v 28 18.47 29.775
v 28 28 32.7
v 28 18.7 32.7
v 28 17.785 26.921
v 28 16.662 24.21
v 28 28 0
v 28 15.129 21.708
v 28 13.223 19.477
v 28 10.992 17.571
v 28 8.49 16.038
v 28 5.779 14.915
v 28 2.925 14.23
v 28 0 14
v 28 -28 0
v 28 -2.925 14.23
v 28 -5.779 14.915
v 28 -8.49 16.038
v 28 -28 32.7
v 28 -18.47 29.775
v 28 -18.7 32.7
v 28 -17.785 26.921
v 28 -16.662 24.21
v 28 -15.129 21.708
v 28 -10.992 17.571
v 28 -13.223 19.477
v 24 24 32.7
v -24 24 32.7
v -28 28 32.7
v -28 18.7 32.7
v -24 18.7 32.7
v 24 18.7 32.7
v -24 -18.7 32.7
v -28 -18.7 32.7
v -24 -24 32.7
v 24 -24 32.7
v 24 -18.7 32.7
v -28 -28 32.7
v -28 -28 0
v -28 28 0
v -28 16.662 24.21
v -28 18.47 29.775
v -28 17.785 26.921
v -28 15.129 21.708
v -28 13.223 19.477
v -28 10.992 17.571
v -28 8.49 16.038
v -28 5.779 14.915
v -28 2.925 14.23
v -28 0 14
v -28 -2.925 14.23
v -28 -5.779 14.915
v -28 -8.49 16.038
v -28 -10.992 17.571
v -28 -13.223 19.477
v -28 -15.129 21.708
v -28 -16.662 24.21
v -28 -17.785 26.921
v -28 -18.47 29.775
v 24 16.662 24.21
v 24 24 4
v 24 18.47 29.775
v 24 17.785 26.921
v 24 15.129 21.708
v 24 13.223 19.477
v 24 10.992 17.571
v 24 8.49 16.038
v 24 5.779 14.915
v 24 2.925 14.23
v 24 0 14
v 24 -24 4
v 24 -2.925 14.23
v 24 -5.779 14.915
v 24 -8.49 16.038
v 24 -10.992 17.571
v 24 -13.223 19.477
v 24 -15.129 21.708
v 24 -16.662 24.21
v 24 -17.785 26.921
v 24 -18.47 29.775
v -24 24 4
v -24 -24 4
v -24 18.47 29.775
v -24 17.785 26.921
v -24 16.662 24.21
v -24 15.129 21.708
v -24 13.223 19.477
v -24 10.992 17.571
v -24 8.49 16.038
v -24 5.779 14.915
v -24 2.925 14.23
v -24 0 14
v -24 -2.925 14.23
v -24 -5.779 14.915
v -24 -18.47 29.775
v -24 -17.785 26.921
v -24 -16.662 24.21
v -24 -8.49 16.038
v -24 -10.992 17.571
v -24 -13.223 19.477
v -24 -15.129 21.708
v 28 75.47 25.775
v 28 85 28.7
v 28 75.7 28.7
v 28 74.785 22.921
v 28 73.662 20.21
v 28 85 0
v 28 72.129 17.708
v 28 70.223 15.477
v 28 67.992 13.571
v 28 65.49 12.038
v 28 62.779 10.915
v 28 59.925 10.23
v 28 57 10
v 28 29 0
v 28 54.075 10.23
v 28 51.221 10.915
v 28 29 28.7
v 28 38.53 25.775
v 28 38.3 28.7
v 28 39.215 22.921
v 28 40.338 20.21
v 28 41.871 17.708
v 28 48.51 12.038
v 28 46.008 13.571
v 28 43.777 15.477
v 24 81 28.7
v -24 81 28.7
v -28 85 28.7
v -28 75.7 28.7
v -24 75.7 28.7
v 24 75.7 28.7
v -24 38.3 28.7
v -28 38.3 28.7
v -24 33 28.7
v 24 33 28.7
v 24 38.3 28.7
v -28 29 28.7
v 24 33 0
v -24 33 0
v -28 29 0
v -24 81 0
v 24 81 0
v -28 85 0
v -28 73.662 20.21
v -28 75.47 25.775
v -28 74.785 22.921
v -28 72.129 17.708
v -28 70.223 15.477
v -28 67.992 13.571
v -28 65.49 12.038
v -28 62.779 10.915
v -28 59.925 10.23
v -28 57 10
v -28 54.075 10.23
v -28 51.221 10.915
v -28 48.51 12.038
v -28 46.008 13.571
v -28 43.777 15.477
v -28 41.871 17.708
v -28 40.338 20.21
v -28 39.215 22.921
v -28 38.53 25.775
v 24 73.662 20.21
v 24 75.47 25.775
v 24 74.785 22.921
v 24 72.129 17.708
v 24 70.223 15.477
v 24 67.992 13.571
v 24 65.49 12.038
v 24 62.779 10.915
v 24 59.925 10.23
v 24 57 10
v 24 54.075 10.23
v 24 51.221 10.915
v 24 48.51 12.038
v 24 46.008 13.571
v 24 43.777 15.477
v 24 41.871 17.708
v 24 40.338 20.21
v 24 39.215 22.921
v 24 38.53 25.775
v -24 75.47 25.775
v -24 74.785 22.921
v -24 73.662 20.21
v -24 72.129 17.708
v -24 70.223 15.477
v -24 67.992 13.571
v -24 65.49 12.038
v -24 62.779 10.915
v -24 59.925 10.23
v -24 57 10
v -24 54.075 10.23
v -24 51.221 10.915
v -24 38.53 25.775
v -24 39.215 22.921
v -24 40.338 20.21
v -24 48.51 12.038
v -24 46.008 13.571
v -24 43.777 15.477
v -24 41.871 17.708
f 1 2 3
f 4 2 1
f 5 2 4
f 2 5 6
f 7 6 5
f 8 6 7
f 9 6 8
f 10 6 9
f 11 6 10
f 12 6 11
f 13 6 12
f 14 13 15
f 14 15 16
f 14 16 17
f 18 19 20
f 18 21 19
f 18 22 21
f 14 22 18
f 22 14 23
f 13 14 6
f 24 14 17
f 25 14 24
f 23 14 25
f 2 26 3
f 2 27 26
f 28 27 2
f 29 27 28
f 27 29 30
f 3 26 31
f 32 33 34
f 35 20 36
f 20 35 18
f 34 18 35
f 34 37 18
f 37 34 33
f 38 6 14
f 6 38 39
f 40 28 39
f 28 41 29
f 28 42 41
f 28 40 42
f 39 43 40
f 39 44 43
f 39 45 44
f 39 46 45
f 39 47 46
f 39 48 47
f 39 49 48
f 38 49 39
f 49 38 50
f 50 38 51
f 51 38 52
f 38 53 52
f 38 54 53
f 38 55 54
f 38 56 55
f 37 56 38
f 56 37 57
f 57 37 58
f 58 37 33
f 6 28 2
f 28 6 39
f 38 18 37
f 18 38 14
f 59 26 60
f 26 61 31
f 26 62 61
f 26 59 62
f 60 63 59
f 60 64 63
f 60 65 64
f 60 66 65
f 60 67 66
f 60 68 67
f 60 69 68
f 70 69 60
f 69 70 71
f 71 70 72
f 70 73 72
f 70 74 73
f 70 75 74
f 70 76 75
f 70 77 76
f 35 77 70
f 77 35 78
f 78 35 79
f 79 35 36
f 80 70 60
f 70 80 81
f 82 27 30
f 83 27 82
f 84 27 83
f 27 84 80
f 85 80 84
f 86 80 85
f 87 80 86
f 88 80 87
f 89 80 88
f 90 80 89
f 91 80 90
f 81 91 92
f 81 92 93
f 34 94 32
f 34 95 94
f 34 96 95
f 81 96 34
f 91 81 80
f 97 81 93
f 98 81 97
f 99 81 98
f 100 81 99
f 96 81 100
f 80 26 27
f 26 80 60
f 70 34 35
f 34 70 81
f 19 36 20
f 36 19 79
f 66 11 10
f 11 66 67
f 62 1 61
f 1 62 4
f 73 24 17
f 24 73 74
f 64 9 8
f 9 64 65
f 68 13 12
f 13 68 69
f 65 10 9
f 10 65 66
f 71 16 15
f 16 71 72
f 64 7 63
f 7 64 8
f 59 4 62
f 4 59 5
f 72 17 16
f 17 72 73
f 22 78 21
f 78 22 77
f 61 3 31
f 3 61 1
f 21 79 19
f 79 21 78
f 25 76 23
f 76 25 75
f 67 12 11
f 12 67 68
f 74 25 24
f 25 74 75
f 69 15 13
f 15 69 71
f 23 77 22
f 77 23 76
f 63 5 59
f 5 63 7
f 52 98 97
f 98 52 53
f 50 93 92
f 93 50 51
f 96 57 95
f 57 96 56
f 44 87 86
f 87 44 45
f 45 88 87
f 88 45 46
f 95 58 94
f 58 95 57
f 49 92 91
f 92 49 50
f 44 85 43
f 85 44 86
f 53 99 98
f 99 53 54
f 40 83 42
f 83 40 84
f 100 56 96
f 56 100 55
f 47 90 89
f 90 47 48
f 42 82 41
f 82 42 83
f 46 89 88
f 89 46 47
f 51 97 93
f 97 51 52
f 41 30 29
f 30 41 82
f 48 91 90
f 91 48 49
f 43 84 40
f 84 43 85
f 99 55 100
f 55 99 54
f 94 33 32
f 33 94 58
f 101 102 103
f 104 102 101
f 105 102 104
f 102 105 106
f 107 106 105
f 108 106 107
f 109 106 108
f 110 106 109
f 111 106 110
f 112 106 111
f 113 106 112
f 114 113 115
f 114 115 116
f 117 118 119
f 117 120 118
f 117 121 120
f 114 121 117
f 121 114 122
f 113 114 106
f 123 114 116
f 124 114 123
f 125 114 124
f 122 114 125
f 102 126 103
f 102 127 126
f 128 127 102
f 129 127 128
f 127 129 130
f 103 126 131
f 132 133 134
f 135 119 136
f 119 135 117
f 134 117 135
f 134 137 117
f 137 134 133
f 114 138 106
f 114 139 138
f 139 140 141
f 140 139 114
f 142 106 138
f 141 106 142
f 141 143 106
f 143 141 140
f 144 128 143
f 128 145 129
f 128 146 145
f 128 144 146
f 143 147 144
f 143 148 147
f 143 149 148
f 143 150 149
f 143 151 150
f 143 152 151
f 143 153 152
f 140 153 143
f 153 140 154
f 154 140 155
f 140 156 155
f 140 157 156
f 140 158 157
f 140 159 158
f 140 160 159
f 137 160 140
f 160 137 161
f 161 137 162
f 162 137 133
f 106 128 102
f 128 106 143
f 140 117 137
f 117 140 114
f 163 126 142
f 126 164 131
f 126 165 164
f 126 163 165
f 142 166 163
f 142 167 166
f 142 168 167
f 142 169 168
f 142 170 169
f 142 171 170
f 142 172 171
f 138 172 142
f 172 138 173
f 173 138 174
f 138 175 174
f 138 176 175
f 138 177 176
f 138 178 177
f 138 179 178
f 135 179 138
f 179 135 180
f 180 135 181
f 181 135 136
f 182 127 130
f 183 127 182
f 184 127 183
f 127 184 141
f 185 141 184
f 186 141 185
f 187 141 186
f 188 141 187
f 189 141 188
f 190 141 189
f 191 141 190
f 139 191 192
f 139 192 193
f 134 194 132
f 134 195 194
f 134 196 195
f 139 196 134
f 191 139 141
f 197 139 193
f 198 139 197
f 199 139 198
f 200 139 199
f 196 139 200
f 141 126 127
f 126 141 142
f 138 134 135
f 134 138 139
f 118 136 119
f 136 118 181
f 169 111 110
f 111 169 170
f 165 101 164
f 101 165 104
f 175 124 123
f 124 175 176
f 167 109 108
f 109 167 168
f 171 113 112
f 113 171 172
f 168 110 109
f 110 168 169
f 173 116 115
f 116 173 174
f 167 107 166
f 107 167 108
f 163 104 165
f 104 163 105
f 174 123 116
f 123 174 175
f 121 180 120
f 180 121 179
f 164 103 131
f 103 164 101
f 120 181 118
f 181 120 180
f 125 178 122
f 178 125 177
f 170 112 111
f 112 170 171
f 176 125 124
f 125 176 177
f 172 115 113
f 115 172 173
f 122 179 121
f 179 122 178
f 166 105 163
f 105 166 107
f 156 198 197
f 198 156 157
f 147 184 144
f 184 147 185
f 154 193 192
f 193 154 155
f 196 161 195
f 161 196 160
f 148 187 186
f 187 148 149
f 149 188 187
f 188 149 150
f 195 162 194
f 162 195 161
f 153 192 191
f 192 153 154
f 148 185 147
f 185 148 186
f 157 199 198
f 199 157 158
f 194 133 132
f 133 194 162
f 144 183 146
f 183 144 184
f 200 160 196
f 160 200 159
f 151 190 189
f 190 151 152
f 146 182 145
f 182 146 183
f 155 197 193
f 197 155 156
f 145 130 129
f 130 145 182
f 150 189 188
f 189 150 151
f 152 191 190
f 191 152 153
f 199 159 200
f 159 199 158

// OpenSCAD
SPACE = 1.0;

/* Initiate
D0 = 35.3 + SPACE;
D1 = 31.4 + SPACE;
LENGTH = 48.0;
*/
D0 = 37.4;
D1 = 37.4;
LENGTH = 48.0;

WIDTH = 48.0;
HALF = (D0 > D1 ? D0 : D1) / 2 + 10;

T = 4.0;

$fn = 40;

difference()
{
    translate([-LENGTH/2 - T, -WIDTH/2 - T, 0]) cube(size=[LENGTH + T*2, WIDTH + T*2, HALF + T]);
    translate([-LENGTH/2, -WIDTH/2, T]) cube(size=[LENGTH, WIDTH, 100.0]);

    translate([0, 0, HALF + T]) rotate([0, 90, 0]) cylinder(h=1000, d=D0);
    translate([0, 0, HALF + T]) rotate([0, -90, 0]) cylinder(h=1000, d=D1);
}

translate([0, WIDTH + T*2 + 1, 0])
{
    difference()
    {
        translate([-LENGTH/2 - T, -WIDTH/2 - T, 0]) cube(size=[LENGTH + T*2, WIDTH + T*2, HALF]);
        translate([-LENGTH/2, -WIDTH/2, 0]) cube(size=[LENGTH, WIDTH, 100.0]);

        translate([0, 0, HALF]) rotate([0, 90, 0]) cylinder(h=1000, d=D0);
        translate([0, 0, HALF]) rotate([0, -90, 0]) cylinder(h=1000, d=D1);
    }
}
